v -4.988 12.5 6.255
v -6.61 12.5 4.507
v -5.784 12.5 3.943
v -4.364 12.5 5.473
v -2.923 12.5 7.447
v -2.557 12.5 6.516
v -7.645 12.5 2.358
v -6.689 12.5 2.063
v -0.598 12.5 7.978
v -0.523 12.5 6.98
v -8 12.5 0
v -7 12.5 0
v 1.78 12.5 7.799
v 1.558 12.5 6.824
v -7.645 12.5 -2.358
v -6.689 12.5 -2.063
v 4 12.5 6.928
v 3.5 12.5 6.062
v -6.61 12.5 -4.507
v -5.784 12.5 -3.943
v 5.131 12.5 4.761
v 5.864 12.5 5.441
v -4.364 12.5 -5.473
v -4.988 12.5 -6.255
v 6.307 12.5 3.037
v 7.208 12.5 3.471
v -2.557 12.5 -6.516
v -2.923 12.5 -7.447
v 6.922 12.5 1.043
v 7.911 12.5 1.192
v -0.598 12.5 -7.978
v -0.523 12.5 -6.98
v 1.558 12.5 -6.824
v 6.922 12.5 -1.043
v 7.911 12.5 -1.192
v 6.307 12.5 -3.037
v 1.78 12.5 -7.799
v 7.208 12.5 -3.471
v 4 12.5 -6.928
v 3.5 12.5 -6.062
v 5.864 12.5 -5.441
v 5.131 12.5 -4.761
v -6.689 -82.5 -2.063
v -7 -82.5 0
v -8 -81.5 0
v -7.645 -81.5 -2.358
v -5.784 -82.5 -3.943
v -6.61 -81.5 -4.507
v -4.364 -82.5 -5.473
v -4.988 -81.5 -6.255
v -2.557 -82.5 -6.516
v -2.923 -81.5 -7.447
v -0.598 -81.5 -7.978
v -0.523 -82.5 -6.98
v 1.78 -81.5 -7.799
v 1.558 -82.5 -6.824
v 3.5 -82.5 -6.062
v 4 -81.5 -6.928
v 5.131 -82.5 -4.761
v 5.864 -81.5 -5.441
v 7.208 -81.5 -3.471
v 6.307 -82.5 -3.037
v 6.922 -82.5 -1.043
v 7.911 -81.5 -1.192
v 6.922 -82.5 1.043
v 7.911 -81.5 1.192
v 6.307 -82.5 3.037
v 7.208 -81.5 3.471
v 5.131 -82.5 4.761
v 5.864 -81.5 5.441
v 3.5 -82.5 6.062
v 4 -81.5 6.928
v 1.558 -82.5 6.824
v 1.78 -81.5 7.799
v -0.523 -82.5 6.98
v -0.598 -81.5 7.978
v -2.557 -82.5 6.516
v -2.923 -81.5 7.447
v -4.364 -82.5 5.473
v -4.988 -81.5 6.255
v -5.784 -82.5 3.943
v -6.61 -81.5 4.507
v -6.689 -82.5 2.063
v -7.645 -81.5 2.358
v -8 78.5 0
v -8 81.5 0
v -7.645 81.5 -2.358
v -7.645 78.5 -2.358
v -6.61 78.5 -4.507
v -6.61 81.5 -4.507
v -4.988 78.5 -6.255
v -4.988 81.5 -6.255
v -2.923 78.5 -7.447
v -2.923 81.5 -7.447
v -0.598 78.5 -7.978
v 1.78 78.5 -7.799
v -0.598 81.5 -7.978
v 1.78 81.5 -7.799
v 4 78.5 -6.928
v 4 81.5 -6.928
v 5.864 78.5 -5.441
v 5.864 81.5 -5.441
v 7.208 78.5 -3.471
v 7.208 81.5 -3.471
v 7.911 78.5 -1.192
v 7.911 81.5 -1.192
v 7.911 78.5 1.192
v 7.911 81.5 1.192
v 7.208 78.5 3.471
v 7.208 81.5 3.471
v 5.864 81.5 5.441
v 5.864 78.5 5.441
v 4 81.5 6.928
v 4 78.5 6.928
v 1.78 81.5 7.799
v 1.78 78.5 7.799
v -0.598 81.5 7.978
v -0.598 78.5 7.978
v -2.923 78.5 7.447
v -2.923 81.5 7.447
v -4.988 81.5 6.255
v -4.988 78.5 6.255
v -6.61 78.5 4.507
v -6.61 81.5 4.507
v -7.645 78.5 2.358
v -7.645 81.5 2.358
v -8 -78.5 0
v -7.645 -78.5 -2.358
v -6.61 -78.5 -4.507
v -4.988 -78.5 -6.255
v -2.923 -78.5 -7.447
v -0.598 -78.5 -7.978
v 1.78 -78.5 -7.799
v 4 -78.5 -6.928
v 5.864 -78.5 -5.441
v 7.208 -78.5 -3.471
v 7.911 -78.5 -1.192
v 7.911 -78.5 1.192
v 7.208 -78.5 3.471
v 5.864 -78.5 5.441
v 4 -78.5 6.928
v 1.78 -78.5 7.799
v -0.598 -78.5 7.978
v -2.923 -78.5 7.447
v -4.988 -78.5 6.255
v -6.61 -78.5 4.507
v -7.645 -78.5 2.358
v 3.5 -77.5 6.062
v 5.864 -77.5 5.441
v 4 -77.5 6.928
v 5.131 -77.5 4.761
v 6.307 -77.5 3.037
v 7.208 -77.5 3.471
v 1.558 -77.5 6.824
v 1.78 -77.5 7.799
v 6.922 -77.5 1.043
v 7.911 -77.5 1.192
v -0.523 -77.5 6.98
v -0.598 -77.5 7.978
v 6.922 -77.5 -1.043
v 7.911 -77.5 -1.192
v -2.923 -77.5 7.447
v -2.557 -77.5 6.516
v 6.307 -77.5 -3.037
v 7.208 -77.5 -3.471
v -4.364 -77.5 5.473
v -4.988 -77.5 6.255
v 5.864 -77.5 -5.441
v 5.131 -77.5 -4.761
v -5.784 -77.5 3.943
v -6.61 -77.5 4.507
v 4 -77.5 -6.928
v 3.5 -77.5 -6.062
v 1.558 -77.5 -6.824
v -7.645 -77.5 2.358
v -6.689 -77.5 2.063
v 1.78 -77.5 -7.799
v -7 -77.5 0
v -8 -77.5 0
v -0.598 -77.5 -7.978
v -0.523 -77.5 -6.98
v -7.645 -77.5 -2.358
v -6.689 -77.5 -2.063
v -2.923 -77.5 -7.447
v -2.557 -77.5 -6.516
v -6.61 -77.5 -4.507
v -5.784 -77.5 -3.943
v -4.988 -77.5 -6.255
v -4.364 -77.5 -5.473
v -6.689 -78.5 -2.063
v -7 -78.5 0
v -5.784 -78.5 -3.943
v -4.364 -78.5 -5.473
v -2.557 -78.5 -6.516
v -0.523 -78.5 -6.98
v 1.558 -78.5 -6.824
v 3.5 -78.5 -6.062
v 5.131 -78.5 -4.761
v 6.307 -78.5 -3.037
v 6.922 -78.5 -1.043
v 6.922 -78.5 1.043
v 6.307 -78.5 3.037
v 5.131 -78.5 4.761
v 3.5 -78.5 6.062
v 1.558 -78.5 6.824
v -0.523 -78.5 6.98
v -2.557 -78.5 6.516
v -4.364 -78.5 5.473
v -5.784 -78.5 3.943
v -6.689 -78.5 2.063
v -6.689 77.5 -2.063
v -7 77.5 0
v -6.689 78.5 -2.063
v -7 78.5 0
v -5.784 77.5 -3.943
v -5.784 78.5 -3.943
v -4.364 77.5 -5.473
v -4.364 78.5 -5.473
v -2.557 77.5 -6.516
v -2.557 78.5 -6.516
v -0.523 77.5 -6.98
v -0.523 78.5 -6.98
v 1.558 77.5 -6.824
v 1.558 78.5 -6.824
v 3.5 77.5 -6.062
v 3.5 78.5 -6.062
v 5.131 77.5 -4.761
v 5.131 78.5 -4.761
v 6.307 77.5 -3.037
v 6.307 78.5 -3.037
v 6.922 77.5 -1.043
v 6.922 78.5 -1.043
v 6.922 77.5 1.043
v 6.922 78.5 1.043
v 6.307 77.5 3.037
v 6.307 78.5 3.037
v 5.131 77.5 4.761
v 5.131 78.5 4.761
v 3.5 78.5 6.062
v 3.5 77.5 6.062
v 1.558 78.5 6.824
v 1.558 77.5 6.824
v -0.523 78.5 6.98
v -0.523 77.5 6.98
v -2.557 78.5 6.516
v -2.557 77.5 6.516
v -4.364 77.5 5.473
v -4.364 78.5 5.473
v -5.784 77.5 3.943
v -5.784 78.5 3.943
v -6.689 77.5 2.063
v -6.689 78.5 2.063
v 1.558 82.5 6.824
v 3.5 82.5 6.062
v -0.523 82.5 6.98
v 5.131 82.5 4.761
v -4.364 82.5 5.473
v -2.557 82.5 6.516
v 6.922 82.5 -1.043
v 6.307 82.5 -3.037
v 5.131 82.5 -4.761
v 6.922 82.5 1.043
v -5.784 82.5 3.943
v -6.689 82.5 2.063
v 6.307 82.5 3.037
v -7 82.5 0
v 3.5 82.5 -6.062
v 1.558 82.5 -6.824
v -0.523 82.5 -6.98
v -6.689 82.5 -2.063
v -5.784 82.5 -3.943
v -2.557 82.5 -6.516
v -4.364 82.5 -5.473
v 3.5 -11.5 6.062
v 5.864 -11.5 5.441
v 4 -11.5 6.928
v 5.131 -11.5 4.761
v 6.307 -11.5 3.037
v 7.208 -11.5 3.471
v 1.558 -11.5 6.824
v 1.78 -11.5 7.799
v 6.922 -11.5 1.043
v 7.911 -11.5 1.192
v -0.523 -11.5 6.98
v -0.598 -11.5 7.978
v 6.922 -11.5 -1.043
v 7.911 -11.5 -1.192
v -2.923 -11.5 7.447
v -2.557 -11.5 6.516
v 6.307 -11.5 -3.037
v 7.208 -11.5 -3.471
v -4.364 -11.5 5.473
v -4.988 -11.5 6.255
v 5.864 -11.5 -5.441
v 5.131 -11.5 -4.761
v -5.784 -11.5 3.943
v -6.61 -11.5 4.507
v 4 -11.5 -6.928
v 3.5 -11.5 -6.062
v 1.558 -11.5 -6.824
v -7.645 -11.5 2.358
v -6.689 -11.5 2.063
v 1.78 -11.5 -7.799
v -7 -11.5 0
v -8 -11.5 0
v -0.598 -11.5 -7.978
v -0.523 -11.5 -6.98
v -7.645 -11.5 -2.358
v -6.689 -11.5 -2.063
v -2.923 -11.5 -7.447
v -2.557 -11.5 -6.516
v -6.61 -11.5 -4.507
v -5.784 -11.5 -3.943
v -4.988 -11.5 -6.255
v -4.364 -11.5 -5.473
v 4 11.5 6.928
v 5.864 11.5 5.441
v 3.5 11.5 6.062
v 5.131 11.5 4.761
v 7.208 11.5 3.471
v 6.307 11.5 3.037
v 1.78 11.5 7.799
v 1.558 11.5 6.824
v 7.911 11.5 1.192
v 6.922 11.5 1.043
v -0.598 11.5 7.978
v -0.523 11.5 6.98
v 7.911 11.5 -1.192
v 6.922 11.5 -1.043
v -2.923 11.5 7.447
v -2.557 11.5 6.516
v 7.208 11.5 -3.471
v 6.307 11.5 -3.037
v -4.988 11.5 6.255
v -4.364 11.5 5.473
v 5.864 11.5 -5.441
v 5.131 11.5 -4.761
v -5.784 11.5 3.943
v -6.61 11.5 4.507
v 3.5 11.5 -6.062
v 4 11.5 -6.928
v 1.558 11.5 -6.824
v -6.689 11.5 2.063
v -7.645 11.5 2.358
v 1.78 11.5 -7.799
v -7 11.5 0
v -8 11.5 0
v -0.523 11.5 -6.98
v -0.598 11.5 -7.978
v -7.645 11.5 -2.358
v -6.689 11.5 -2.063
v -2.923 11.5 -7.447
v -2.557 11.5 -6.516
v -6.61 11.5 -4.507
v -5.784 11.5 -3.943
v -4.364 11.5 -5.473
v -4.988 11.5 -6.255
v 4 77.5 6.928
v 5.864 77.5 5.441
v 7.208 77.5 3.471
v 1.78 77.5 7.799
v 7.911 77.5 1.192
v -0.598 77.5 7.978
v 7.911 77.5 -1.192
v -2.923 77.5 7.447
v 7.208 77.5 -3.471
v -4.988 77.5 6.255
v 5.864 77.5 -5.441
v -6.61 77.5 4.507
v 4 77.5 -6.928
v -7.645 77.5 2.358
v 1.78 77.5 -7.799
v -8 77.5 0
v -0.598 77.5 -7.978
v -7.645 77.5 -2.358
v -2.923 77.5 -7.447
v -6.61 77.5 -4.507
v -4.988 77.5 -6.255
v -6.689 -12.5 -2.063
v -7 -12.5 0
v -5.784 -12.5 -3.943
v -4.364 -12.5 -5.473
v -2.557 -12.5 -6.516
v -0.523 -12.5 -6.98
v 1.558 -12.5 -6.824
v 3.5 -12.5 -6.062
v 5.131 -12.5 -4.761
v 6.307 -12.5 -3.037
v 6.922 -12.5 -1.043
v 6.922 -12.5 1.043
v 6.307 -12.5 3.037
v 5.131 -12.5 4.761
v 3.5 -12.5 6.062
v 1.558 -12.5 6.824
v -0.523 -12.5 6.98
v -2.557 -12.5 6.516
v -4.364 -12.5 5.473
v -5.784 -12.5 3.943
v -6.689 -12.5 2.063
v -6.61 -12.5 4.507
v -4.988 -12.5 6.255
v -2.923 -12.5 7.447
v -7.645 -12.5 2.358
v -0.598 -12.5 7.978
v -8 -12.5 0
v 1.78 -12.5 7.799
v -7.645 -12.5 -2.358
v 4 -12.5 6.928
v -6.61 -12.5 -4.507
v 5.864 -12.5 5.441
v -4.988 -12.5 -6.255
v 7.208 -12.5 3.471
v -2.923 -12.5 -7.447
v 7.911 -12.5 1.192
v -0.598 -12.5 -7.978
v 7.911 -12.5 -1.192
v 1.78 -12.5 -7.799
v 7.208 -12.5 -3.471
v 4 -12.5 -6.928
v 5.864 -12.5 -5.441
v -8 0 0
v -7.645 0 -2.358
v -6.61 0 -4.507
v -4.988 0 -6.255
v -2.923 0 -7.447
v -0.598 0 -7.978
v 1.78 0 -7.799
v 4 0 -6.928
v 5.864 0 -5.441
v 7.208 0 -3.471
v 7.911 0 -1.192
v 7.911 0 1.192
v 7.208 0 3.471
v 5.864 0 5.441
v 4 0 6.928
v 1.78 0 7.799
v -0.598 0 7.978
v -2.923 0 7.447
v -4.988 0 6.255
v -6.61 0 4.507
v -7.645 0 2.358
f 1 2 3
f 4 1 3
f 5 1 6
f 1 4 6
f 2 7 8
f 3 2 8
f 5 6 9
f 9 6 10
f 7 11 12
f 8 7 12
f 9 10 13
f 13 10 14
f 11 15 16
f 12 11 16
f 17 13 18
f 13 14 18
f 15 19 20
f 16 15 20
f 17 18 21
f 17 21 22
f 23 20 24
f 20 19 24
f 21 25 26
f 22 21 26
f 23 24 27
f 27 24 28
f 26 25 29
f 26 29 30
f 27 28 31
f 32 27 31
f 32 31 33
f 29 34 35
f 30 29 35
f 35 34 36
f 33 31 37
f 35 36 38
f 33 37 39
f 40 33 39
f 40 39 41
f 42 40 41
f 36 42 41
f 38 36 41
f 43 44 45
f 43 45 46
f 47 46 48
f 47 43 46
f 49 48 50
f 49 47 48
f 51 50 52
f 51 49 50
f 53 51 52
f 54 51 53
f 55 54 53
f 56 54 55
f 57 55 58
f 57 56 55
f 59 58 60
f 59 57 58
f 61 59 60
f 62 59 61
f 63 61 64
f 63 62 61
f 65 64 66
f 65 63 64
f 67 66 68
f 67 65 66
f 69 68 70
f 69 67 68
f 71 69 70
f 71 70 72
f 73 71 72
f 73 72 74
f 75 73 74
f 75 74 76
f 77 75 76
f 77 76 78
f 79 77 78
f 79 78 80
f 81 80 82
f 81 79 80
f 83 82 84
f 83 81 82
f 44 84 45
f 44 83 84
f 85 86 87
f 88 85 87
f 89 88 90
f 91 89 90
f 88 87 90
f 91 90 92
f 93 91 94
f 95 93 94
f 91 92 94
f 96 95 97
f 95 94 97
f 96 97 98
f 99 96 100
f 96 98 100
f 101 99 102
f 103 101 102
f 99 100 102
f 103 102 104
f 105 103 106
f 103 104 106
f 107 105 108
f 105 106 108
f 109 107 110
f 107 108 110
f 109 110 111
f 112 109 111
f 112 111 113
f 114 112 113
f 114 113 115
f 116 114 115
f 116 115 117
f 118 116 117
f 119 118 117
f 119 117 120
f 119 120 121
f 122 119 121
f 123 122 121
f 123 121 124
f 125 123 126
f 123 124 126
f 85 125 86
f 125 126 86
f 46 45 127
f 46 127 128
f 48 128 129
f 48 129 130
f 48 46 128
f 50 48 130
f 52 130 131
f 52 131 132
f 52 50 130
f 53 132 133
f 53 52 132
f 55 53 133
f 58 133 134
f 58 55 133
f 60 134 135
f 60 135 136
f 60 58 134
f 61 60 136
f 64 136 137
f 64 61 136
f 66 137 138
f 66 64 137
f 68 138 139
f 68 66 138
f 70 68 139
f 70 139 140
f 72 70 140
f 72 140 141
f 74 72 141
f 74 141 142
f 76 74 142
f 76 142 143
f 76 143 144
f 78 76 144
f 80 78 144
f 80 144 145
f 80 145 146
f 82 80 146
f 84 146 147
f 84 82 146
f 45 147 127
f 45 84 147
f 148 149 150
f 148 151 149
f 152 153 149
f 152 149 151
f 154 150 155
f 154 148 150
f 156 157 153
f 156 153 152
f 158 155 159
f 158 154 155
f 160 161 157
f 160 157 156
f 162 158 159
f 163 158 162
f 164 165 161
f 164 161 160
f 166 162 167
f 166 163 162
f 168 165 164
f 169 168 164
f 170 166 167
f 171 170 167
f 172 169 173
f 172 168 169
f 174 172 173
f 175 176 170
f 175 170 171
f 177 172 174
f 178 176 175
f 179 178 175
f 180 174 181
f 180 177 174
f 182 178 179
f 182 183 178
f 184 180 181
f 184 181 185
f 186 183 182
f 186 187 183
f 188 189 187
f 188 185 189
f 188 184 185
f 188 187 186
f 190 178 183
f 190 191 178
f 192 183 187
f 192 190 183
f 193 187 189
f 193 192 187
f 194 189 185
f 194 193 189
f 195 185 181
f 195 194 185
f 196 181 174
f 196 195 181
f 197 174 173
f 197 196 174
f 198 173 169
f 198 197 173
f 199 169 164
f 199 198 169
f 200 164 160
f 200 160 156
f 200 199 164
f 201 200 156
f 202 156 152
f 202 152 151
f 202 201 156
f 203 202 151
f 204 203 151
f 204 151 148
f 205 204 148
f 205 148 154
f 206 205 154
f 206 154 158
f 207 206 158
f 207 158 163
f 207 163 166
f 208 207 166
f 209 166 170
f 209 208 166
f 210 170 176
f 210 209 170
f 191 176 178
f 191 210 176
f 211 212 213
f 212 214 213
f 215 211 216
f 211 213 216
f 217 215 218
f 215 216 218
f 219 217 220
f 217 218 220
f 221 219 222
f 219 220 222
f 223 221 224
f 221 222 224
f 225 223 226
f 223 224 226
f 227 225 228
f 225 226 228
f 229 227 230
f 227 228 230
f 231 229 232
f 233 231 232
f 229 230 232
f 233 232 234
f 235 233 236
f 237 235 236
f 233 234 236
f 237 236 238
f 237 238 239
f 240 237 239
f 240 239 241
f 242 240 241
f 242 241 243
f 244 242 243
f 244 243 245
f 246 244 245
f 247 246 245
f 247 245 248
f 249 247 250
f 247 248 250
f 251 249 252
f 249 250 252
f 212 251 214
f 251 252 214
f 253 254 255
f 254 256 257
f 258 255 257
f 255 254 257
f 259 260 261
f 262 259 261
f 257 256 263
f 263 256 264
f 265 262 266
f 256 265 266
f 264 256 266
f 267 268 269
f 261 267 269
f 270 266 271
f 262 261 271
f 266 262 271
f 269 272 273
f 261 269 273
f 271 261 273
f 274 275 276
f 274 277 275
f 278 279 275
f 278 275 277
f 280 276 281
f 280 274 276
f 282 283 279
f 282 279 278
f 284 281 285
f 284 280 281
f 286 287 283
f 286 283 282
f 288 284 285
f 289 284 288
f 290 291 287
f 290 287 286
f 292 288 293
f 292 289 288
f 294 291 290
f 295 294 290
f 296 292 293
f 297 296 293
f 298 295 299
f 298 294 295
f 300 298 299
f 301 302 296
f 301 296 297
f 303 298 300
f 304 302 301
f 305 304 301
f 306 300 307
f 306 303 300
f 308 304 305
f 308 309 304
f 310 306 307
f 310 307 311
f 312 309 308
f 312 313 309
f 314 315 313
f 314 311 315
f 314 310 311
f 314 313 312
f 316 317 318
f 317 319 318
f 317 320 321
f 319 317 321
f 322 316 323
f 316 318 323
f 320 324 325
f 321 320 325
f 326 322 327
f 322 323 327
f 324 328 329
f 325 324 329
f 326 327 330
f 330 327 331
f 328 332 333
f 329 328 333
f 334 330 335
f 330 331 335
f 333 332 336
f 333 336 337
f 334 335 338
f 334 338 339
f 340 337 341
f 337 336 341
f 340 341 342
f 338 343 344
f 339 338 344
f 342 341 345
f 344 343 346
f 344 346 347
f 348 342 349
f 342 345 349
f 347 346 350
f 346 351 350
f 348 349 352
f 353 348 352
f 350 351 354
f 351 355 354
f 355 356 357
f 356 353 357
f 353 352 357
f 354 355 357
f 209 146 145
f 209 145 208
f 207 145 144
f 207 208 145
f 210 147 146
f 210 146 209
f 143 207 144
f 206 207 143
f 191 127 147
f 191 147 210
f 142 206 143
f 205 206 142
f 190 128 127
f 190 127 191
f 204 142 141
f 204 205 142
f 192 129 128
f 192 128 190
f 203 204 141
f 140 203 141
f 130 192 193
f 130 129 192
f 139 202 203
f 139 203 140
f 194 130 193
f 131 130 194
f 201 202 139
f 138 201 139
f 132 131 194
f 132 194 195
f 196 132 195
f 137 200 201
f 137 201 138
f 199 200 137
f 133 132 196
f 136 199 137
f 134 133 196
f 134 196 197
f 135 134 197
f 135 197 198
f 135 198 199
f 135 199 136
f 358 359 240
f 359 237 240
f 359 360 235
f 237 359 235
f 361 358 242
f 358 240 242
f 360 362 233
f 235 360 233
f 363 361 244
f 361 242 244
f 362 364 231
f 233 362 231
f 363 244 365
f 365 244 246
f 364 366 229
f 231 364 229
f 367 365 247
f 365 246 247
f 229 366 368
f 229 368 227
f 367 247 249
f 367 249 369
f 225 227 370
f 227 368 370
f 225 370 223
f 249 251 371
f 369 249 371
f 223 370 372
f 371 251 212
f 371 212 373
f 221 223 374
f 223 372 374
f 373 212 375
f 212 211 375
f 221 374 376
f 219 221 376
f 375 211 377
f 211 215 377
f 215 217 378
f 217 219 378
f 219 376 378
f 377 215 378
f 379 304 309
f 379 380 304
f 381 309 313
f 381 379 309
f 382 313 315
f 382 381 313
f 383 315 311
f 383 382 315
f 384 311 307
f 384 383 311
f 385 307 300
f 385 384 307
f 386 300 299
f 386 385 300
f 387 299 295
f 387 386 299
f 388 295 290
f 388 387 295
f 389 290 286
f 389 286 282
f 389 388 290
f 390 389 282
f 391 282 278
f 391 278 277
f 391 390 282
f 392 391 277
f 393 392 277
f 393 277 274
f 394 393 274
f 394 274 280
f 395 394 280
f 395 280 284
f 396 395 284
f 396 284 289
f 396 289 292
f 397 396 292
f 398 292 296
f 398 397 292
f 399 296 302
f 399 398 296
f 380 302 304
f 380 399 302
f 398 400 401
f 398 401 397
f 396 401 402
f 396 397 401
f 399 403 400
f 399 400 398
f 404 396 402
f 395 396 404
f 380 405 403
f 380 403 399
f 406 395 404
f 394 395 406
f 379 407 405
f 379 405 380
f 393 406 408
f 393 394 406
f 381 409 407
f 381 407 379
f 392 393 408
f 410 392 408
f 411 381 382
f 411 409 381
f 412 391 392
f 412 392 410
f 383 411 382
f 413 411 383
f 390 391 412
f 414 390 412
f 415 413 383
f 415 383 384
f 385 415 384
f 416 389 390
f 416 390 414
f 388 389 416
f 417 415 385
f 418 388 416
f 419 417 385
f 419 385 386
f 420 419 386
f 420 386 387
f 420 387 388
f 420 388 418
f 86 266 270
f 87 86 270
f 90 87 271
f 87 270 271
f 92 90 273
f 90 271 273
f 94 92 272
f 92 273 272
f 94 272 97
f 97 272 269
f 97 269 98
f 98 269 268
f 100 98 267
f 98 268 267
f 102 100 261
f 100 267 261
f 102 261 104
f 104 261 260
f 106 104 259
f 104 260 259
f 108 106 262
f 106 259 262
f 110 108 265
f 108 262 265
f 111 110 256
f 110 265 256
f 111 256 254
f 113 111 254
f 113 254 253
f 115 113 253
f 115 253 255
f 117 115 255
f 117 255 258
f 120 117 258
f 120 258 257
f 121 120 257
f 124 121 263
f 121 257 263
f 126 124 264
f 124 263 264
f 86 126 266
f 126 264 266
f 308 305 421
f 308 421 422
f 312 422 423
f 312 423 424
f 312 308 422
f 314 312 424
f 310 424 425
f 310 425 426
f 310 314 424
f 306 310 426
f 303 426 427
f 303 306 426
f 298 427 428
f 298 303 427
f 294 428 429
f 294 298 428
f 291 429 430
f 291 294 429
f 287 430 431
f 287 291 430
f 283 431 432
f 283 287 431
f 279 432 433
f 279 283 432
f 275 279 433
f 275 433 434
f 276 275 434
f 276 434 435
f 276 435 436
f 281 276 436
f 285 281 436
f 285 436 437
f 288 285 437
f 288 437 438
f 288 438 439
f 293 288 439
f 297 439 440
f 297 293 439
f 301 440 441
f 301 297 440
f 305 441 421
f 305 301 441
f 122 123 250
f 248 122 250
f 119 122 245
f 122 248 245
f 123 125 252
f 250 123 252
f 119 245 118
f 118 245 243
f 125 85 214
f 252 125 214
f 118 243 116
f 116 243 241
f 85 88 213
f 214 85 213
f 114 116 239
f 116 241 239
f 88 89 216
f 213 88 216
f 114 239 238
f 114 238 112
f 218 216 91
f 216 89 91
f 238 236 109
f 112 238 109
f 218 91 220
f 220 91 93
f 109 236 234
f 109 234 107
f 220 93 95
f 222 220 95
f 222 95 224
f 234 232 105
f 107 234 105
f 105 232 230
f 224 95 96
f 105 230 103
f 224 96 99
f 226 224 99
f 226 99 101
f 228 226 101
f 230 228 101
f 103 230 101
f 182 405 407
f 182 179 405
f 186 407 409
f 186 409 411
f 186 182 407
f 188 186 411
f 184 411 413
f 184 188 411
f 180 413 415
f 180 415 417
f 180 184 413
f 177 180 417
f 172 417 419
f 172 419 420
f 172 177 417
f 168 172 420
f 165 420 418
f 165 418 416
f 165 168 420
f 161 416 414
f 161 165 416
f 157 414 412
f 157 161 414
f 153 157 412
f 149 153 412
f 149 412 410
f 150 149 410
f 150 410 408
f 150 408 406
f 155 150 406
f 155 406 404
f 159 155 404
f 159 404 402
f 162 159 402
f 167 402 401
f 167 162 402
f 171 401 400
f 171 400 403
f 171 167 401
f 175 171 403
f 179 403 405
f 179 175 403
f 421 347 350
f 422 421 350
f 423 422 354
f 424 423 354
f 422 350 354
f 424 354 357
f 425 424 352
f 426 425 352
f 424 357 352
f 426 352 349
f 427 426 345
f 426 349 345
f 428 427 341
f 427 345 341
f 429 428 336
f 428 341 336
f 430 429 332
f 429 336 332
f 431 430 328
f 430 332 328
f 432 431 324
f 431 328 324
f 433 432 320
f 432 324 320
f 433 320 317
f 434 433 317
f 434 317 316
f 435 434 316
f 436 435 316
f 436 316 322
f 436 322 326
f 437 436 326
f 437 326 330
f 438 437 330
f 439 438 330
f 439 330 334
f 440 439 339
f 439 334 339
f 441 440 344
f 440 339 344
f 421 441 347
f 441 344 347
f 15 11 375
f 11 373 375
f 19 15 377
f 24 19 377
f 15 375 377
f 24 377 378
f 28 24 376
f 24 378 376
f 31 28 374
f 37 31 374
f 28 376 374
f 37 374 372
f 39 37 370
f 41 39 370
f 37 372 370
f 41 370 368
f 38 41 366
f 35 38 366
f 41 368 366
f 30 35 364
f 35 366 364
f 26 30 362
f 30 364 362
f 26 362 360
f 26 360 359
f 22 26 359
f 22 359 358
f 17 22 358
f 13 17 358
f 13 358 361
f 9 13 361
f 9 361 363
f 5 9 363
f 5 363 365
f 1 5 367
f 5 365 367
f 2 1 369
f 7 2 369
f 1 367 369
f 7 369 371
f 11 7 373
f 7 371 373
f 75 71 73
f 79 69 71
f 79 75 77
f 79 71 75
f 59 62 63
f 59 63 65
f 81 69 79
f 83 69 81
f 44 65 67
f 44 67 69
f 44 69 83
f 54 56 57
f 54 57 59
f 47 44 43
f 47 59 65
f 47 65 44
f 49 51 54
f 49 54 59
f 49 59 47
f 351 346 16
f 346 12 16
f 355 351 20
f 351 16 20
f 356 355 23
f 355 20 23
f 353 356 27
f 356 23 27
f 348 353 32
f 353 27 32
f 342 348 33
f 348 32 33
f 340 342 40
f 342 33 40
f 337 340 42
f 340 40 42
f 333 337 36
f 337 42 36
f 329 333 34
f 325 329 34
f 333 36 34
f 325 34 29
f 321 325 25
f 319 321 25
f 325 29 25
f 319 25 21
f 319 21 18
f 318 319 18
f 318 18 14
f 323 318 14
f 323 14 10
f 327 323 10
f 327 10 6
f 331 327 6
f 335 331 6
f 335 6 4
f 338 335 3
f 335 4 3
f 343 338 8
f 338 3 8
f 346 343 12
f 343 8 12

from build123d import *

# Parameters (mm, degrees)
CHAMFER1_SIZE = 1


with BuildPart() as part:
    # Sketch2 → Revolve1 (revolve)
    with BuildSketch(Plane.XY, mode=Mode.PRIVATE) as revolve1_sk:
        Polygon((0, 0), (8, 0), (8, 11.5), (7, 11.5), (7, 12.5), (8, 12.5), (8, 77.5), (7, 77.5), (7, 78.5), (8, 78.5), (8, 82.5), (0, 82.5), align=None)
    revolve1 = revolve(revolve1_sk.sketch.rotate(Axis((0, 82.5, 0), (0, -1, 0)), 180), axis=Axis((0, 82.5, 0), (0, -1, 0)))

    # Mirror1: Revolve1 across plane
    add(revolve1.mirror(Plane.ZX))

    # Chamfer1
    chamfer1_edges = [part.edges().sort_by_distance(p)[0] for p in [
        (8, -82.5, 0),
        (8, 82.5, 0),
    ]]
    chamfer(chamfer1_edges, length=CHAMFER1_SIZE)


solid = part.part
